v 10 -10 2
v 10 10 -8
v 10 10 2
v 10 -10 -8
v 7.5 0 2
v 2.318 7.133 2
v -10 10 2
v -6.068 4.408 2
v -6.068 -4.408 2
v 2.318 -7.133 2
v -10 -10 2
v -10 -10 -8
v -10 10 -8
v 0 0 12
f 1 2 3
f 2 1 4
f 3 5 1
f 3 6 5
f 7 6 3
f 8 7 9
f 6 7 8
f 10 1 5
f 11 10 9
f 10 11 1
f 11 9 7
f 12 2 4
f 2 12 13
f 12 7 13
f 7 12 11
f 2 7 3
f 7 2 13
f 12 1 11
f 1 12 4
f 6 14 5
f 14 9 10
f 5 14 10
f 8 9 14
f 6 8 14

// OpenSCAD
/* coincident tests */
translate([0,0,2]) {
    translate([0,0,-5]) {
        cube([20,20,10], center=true);
    }
    translate([0,0,+5]) {
        cylinder(h = 10, d1 = 15, d2=0, $fn = 5, center=true);
    }
}
